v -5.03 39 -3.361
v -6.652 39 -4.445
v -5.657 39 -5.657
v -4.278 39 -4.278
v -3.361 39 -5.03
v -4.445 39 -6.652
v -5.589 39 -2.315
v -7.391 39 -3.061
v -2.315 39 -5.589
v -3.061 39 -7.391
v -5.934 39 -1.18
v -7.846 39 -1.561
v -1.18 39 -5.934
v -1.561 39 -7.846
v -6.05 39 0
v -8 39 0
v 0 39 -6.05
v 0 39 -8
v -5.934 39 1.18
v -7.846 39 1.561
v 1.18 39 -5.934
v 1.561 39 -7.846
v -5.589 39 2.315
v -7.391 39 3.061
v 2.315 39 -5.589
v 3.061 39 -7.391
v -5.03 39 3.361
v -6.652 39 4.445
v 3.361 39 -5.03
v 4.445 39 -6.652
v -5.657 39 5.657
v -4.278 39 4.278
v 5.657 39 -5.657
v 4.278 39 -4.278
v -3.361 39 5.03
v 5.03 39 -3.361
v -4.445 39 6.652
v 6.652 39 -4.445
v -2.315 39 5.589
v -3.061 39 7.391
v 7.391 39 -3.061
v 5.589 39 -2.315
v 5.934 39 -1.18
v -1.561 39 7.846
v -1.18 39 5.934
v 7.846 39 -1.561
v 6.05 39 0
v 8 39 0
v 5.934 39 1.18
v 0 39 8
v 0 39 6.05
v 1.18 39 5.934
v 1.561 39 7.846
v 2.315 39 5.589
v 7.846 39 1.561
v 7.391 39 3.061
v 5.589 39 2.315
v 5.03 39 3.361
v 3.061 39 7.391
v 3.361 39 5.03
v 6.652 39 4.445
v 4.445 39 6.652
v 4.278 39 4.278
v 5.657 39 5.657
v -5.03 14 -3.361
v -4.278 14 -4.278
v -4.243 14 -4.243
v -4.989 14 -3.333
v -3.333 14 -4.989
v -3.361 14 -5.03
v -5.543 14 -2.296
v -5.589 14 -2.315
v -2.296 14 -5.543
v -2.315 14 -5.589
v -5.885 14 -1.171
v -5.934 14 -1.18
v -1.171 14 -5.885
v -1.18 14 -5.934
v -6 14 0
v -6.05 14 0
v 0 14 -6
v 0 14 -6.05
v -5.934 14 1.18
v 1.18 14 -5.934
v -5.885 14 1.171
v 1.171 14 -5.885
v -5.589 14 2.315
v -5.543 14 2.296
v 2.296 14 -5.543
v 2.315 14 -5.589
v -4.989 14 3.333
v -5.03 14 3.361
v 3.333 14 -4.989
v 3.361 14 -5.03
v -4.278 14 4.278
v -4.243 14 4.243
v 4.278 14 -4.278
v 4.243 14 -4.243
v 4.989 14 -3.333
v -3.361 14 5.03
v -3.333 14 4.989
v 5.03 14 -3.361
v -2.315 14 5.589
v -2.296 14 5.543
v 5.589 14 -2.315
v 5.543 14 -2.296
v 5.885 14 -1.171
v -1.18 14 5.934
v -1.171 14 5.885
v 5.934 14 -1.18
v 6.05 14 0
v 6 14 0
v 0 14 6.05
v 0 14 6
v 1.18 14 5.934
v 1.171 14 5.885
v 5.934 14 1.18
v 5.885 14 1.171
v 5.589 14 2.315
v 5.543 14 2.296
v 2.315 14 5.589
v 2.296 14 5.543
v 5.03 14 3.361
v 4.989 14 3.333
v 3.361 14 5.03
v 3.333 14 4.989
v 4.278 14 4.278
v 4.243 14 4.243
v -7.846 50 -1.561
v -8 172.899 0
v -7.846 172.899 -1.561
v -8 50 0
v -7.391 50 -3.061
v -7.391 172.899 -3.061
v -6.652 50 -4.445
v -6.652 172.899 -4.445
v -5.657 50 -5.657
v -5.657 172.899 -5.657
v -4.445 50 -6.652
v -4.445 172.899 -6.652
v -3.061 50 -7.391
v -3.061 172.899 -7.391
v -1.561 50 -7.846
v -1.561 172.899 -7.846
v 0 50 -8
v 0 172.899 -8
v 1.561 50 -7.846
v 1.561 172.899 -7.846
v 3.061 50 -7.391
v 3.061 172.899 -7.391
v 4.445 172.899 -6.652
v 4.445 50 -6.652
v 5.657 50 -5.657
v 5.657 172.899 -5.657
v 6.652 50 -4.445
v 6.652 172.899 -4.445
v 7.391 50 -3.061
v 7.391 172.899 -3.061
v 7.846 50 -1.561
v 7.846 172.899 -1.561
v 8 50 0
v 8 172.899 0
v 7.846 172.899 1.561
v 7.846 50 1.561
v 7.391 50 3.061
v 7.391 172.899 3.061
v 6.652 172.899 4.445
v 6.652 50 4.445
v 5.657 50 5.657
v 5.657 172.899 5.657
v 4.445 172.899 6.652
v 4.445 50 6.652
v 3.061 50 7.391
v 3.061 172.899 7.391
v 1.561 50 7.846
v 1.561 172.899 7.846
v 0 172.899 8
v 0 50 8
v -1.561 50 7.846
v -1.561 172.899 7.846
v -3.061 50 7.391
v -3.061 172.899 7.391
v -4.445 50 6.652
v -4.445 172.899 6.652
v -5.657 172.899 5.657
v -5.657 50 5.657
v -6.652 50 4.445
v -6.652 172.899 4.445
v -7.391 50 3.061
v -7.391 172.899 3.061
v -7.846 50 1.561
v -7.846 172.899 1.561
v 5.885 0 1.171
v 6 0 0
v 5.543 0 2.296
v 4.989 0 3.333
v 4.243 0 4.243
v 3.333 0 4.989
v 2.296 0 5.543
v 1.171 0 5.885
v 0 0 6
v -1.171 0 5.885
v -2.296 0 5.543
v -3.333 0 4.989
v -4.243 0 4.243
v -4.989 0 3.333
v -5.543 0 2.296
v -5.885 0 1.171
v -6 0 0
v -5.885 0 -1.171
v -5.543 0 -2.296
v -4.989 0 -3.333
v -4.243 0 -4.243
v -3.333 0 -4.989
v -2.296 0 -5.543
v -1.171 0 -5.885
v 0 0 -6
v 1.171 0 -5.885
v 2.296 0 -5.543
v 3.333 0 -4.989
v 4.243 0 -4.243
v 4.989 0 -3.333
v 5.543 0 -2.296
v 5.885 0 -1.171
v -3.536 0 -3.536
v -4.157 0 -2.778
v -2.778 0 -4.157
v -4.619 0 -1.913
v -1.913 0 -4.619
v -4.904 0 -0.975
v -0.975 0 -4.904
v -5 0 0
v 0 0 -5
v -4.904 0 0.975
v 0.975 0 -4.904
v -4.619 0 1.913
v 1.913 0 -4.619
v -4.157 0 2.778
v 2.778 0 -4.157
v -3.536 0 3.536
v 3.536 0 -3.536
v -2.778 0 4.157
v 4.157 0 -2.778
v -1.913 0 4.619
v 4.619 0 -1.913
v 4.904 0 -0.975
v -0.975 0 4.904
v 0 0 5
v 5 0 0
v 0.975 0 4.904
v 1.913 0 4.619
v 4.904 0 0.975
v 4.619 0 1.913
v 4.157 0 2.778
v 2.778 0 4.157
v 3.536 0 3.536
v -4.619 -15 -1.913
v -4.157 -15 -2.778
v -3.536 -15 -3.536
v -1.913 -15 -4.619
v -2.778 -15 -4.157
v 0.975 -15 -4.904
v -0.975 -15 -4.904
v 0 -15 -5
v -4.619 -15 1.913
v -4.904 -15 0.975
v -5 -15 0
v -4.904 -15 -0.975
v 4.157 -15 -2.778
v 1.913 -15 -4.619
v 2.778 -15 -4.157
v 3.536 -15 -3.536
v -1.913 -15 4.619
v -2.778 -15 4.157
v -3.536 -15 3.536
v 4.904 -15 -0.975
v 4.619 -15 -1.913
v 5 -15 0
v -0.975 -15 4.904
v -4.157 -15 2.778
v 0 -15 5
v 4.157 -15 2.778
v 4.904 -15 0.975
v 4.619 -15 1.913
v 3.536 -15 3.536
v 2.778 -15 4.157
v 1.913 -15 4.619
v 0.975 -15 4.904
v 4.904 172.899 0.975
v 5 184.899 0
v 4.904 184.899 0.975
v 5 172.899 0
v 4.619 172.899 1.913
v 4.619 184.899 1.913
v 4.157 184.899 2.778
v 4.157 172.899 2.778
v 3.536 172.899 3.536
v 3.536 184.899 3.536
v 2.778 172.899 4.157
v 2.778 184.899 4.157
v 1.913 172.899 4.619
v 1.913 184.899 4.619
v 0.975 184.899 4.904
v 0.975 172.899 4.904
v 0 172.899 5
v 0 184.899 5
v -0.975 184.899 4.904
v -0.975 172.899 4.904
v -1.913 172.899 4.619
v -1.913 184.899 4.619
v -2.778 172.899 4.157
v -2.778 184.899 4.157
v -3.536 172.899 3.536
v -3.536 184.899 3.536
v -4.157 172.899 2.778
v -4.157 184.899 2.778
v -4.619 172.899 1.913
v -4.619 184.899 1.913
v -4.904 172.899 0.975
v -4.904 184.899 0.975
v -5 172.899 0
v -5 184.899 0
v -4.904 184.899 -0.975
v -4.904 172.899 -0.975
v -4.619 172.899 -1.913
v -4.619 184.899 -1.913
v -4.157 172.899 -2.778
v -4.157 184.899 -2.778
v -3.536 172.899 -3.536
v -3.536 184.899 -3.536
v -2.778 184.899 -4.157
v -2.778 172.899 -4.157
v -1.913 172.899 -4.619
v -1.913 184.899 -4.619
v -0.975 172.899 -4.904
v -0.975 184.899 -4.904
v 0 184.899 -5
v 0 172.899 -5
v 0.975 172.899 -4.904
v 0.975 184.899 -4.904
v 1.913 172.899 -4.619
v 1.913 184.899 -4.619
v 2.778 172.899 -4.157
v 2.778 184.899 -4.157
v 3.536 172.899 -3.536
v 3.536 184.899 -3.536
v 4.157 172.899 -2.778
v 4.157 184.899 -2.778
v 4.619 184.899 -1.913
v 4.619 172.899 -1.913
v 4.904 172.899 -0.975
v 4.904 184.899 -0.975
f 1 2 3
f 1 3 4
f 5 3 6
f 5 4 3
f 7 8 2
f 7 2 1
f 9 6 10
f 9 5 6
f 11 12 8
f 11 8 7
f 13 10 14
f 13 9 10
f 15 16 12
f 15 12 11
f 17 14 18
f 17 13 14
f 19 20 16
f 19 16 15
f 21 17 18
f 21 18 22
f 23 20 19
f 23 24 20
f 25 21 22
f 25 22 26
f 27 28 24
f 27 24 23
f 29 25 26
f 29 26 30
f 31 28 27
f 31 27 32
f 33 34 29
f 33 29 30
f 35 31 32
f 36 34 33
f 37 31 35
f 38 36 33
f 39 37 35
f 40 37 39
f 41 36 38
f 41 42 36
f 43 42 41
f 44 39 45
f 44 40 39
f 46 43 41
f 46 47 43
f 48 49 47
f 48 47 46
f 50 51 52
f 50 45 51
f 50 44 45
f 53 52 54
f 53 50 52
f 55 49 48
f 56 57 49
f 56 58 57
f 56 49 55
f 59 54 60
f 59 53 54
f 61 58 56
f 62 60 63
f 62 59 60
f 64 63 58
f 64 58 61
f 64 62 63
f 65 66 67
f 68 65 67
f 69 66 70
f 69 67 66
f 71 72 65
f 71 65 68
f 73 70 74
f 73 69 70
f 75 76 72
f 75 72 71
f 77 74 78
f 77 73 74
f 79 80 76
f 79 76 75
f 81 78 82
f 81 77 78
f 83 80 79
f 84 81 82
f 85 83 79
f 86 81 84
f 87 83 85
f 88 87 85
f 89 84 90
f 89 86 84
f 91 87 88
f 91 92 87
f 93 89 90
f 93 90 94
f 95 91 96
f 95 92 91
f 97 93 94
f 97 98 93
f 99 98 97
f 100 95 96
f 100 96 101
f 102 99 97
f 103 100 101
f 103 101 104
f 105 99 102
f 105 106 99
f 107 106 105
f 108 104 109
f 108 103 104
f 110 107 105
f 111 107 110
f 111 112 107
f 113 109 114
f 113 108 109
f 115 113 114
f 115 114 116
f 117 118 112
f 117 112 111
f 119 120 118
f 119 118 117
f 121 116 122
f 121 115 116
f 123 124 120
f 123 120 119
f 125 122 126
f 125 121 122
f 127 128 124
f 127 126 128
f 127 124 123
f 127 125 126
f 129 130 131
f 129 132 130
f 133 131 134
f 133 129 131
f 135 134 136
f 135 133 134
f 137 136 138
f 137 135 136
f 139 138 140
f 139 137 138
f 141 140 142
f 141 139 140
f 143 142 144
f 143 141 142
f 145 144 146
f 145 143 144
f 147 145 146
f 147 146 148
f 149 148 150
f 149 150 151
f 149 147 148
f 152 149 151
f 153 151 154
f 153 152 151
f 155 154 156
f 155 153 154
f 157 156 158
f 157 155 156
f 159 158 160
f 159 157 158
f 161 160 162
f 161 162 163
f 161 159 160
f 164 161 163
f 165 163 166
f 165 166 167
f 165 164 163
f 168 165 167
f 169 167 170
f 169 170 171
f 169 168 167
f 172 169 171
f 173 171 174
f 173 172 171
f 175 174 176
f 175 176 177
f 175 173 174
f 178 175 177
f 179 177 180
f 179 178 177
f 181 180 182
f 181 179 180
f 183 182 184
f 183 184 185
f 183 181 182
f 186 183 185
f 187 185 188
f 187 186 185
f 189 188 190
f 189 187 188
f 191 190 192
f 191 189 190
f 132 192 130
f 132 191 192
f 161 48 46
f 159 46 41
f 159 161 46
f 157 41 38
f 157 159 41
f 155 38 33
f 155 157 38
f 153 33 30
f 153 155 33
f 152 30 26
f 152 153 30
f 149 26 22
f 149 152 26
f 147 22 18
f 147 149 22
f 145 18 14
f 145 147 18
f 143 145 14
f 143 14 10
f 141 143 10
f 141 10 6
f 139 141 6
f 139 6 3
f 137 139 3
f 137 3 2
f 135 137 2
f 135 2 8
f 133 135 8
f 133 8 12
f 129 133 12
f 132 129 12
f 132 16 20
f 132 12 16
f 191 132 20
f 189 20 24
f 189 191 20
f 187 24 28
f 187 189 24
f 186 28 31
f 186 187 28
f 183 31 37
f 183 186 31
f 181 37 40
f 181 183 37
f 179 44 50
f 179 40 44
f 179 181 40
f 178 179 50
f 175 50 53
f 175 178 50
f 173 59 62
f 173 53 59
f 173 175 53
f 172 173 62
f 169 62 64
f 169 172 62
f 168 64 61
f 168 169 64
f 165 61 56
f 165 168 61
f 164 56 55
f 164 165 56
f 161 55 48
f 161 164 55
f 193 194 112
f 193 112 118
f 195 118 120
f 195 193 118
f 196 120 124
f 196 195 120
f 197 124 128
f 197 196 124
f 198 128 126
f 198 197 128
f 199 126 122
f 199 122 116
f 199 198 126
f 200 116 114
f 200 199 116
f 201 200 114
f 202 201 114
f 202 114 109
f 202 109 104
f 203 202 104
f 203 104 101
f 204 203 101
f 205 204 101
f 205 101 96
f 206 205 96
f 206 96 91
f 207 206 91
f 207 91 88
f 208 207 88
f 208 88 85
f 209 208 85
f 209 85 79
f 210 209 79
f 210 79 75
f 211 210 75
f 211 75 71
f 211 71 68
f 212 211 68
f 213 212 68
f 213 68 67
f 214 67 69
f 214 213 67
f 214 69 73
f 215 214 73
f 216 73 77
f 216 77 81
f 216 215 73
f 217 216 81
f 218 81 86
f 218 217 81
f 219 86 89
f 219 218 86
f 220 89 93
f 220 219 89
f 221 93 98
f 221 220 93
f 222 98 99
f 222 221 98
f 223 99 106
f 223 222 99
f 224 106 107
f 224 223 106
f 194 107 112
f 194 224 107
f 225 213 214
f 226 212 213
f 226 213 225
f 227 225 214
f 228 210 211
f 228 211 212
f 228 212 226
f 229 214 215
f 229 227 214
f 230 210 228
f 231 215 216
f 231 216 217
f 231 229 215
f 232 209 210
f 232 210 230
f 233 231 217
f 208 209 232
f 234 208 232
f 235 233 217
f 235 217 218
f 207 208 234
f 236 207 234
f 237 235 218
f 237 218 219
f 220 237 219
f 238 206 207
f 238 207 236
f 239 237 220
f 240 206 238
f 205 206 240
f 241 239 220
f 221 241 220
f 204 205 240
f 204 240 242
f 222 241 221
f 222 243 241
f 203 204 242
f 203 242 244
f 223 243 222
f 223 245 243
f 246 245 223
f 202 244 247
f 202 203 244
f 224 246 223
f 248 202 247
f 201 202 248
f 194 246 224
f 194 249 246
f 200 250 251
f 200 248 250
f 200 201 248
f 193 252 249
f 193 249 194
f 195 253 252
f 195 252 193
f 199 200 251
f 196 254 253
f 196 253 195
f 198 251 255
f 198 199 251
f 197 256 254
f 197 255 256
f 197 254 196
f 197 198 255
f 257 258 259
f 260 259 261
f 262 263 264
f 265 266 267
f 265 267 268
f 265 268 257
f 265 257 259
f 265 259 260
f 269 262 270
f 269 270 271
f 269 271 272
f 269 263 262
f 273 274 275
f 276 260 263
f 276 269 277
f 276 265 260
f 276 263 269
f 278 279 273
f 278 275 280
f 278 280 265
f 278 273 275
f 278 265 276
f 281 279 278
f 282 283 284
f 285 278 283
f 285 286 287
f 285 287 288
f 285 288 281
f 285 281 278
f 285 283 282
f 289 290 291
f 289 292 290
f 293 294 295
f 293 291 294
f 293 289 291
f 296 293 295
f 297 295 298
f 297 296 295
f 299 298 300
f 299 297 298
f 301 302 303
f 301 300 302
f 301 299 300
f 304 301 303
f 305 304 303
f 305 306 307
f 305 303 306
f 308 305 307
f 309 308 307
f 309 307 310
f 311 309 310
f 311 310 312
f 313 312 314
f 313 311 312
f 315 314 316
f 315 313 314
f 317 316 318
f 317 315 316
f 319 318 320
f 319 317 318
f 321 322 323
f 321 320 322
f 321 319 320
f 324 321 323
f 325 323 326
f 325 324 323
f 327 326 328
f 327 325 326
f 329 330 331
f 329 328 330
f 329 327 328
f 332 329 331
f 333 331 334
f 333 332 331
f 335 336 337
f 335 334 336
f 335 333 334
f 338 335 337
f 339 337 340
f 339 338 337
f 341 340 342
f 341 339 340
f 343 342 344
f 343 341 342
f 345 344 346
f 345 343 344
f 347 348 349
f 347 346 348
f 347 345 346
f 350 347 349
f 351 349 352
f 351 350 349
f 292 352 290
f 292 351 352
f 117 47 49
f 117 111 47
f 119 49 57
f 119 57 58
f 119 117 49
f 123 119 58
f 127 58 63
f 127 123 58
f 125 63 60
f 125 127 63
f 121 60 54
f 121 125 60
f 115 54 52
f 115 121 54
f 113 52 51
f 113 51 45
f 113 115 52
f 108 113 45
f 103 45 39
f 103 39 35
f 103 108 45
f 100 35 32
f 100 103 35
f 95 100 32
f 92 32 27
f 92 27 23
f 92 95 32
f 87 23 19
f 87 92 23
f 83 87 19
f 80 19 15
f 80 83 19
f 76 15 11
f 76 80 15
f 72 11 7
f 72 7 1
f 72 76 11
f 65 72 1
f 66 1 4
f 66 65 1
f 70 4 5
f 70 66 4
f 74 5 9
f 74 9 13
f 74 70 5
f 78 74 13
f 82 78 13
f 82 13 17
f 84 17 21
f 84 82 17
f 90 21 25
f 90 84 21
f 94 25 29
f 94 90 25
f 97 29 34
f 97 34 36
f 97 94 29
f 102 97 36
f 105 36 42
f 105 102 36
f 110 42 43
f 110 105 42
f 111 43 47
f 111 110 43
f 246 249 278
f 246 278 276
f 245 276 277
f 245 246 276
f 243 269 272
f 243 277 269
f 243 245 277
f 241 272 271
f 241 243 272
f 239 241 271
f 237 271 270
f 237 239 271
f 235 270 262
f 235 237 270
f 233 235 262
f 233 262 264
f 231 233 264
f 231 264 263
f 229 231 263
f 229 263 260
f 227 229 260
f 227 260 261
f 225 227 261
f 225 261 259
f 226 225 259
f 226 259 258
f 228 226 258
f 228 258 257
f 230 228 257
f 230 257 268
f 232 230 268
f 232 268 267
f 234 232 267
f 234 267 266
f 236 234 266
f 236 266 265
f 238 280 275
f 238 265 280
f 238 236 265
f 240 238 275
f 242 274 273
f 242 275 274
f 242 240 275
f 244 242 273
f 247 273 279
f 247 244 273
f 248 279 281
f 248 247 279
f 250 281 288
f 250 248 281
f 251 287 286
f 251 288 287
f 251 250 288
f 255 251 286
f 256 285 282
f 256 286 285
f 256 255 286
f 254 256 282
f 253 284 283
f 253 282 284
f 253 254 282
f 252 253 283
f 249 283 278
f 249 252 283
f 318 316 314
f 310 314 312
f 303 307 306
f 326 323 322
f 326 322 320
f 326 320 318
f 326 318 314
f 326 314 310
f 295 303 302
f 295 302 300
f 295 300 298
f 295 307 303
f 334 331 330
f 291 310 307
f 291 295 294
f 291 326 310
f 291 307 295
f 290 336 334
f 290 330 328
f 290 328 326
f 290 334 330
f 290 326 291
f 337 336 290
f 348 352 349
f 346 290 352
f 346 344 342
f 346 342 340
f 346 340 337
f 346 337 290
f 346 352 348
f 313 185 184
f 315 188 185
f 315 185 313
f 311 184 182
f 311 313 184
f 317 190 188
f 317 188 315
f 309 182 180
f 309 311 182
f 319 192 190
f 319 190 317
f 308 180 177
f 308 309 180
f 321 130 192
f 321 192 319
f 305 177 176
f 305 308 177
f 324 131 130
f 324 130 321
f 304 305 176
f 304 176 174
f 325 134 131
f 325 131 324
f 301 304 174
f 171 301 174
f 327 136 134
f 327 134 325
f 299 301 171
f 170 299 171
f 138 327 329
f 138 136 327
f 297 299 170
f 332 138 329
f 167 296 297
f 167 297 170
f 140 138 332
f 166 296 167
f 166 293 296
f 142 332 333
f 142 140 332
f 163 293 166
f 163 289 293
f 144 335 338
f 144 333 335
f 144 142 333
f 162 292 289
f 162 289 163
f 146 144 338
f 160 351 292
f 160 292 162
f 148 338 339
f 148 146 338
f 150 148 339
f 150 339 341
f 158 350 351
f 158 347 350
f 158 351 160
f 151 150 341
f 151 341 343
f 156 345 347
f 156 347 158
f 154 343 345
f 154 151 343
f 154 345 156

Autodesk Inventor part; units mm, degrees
ref_plane "YZ Plane" through (0, 0, 0) normal (1, 0, 0) x (0, 1, 0)
ref_plane "XZ Plane" through (0, 0, 0) normal (0, 1, 0) x (-1, 0, 0)
ref_plane "XY Plane" through (0, 0, 0) normal (0, 0, 1) x (1, 0, 0)
sketch "Sketch1" plane through (0, 0, 0) normal (0, 1, 0) x (-1, 0, 0)
  circle A0 centre (0, 0) radius 8
  dimension "d0" = 16
extrude "Extrusion1" add sketch "Sketch1" along normal blind 200
sketch "Sketch2" plane through (0, 0, 0) normal (0, -1, 0) x (1, 0, 0)
  circle A0 centre (0, 0) radius 8 projected
extrude "Extrusion2" cut sketch "Sketch2" against normal blind 50
sketch "Sketch3" plane through (0, 50, 0) normal (0, -1, 0) x (1, 0, 0)
  circle A0 centre (0, 0) radius 8 projected
extrude "Extrusion3" add sketch "Sketch3" along normal blind 50
sketch "Sketch4" plane through (0, 0, 0) normal (0, -1, 0) x (1, 0, 0)
  circle A0 centre (0, 0) radius 8 projected
  circle A1 centre (0, 0) radius 6
  dimension "d7" = 12
extrude "Extrusion4" cut sketch "Sketch4" against normal blind 14
thread "Thread1" size "M12x1" class "6g" standard "ANSI Metric M Profile" full length
sketch "Sketch6" plane through (0, 14, 0) normal (0, -1, 0) x (1, 0, 0)
  circle A0 centre (0, 0) radius 8 projected
  circle A1 centre (0, 0) radius 6.05
  dimension "d13" = 12.1
extrude "Extrusion5" cut sketch "Sketch6" against normal blind 25
sketch "Sketch7" plane through (0, 0, 0) normal (0, -1, 0) x (1, 0, 0)
  circle A0 centre (0, 0) radius 6 projected
  circle A1 centre (0, 0) radius 5
  dimension "d16" = 10
extrude "Extrusion6" add sketch "Sketch7" along normal blind 15 contours A1
sketch "Sketch8" plane through (0, 200, 0) normal (0, 1, 0) x (1, 0, 0)
  circle A0 centre (0, 0) radius 8 projected
extrude "Extrusion7" cut sketch "Sketch8" against normal blind 27.101
sketch "Sketch9" plane through (0, 172.899, 0) normal (0, 1, 0) x (1, 0, 0)
  circle A0 centre (0, 0) radius 8 projected
  circle A1 centre (0, 0) radius 5
  dimension "d21" = 10
extrude "Extrusion8" add sketch "Sketch9" along normal blind 12 contours A1
properties part number "1605_200mm"
